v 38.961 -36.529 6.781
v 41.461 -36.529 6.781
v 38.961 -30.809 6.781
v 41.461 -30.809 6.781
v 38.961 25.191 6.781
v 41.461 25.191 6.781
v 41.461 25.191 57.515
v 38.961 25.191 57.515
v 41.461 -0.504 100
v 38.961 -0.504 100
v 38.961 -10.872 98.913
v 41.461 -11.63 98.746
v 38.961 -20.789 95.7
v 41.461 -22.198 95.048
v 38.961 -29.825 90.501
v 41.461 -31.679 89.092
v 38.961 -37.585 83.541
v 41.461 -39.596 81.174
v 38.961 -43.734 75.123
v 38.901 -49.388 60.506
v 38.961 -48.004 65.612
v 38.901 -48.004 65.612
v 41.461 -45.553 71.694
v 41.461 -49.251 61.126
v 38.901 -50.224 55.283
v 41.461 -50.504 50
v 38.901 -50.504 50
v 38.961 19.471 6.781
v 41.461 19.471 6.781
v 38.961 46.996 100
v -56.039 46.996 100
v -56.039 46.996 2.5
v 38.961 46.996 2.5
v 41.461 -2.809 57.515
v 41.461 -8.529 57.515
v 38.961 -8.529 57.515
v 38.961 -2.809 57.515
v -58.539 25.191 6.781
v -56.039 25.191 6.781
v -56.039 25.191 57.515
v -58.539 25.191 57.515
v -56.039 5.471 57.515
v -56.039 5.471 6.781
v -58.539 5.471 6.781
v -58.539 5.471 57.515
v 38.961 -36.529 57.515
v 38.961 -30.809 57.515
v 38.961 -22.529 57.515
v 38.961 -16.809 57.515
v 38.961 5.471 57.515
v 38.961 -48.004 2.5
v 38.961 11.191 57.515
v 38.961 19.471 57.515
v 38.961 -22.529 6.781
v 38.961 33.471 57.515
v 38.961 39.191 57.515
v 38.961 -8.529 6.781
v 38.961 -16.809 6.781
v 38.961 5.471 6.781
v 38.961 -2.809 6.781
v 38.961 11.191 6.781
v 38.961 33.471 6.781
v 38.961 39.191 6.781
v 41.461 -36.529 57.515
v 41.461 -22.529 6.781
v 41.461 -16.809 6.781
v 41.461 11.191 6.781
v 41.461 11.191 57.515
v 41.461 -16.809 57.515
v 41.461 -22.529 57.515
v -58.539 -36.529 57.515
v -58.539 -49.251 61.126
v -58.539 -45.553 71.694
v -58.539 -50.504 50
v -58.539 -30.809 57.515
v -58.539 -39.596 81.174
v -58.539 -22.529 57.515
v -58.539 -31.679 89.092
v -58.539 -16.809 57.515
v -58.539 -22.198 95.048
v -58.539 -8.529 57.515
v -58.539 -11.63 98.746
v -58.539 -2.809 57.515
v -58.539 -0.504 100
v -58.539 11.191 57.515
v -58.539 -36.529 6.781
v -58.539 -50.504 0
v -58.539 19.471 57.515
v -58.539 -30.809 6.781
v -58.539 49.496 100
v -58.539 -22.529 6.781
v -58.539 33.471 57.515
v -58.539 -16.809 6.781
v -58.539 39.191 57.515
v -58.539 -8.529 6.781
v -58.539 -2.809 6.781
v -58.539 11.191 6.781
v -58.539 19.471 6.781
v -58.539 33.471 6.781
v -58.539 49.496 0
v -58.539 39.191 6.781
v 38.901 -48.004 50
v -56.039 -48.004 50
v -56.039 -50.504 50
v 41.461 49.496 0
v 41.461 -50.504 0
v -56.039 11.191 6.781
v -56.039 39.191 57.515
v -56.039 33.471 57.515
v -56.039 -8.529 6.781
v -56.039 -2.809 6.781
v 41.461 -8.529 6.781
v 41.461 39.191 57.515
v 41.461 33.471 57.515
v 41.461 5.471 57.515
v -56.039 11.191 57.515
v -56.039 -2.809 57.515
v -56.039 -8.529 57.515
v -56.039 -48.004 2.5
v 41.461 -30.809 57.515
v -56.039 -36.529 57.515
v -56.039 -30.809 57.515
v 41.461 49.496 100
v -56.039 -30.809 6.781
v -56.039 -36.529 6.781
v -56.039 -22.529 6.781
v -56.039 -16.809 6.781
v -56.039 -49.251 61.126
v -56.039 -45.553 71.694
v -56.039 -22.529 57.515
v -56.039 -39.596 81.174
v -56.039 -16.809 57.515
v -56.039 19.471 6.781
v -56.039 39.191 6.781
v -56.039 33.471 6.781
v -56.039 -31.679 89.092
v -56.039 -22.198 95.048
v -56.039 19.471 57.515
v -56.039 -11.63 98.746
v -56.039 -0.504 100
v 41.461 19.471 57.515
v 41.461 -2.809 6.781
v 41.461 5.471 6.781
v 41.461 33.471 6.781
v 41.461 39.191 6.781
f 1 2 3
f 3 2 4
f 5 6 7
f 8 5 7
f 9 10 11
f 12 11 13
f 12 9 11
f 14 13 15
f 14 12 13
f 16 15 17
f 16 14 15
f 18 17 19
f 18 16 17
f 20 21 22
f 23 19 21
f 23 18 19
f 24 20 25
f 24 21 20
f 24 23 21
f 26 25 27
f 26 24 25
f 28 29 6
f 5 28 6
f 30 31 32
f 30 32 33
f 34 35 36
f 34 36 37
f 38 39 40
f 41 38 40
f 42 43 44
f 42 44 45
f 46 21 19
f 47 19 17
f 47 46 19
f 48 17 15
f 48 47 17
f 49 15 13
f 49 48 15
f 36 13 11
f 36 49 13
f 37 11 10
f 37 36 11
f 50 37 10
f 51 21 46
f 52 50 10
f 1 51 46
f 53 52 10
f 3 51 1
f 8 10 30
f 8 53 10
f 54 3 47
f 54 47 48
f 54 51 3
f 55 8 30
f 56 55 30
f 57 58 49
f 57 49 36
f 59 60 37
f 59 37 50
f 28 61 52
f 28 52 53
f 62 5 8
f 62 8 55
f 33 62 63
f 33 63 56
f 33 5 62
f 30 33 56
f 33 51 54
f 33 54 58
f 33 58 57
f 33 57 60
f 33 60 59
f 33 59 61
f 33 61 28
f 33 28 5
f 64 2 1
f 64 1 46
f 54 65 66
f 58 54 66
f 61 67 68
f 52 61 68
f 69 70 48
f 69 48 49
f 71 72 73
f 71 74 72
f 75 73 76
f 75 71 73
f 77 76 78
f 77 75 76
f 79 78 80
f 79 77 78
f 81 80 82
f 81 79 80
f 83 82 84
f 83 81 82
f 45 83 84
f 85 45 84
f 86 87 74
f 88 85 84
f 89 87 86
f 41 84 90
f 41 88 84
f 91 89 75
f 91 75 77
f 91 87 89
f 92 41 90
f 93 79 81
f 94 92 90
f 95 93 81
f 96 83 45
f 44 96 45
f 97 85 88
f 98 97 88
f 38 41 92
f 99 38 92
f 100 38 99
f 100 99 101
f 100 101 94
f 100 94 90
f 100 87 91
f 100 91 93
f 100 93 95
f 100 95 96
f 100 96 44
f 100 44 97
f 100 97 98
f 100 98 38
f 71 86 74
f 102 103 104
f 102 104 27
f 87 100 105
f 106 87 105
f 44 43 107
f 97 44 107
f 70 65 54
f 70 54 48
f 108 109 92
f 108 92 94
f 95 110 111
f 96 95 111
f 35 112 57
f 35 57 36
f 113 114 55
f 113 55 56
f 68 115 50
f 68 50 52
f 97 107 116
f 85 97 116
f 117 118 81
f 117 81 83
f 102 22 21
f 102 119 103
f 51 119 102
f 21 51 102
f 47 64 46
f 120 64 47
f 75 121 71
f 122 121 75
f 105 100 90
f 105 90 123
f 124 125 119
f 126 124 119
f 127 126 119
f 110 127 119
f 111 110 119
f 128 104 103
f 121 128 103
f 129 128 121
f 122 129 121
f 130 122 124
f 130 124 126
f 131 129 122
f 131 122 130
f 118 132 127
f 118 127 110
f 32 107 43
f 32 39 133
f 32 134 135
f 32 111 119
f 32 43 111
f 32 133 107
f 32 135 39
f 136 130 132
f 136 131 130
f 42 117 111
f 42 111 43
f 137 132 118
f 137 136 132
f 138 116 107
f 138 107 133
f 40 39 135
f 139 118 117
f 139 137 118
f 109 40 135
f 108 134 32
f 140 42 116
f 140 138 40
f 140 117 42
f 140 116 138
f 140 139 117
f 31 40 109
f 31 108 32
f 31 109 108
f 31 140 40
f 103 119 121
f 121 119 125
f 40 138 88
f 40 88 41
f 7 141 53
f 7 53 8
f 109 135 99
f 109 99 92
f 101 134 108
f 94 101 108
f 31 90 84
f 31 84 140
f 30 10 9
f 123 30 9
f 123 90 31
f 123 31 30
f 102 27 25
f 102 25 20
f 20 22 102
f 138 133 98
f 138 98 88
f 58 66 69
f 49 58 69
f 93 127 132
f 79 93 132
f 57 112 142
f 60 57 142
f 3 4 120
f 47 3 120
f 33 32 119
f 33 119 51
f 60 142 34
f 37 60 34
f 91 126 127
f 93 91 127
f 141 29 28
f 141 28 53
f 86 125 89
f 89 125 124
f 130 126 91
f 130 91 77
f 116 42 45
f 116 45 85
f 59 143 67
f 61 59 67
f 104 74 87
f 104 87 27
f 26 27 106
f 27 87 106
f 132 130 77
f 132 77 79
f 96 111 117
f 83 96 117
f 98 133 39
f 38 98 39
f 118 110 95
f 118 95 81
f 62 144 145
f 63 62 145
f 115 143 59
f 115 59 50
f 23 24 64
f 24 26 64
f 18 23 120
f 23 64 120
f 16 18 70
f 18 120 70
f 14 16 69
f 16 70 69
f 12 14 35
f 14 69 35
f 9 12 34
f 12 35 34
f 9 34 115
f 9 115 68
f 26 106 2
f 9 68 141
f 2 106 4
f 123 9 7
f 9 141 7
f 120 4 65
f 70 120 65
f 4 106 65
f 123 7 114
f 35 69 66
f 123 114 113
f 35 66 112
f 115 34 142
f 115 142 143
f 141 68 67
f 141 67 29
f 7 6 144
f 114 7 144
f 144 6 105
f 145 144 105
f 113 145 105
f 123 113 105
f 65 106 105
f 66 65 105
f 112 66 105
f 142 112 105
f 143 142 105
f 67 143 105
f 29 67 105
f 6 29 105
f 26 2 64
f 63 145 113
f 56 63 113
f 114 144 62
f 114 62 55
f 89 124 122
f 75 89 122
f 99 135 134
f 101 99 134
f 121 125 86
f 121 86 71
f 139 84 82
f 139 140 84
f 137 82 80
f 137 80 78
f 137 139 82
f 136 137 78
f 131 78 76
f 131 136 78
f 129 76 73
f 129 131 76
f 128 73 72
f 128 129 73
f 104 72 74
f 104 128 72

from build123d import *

# Parameters (mm, degrees)
F0_W     = 100
F0_H     = 100
F1_DEPTH = 100
F2_T     = -2.5
F3_W     = 94.9397633225
F3_H     = 2.5
F4_DEPTH = 50
F5_R     = 50
F6_W     = 5.7191289961
F6_H     = 50.7341860794
F7_DEPTH = 100.001


with BuildPart() as f1:
    # F0 (on Top) → F1 (new body)
    with BuildSketch(Plane.XY):
        with Locations((-8.5391569883, -0.5041474987)):
            Rectangle(F0_W, F0_H)
    extrude(amount=F1_DEPTH)

    # F2
    f2_openings = [f1.faces().sort_by_distance(p)[0] for p in [
        (-8.539157, -0.504147, 100),
    ]]
    offset(amount=F2_T, openings=f2_openings)

    # F3 (on face) → F4 (cut)
    with BuildSketch(Plane.XY.offset(100)):
        with Locations((-8.569275327, -49.2541474987)):
            Rectangle(F3_W, F3_H)
    extrude(amount=-F4_DEPTH, mode=Mode.SUBTRACT)

    # F5
    f5_edges = [f1.edges().sort_by_distance(p)[0] for p in [
        (-57.289157, -50.504147, 100),
        (40.180725, -50.504147, 100),
    ]]
    fillet(f5_edges, radius=F5_R)

    # F6 (on face) → F7 (cut, through all)
    with BuildSketch(Plane.YZ.offset(41.4608430117)):
        with Locations((-33.6690526456, 32.1479656268)):
            Rectangle(F6_W, F6_H)
        with Locations((-19.6690526456, 32.1479656268)):
            Rectangle(F6_W, F6_H)
        with Locations((-5.6690526456, 32.1479656268)):
            Rectangle(F6_W, F6_H)
        with Locations((8.3309473544, 32.1479656268)):
            Rectangle(F6_W, F6_H)
        with Locations((22.3309473544, 32.1479656268)):
            Rectangle(F6_W, F6_H)
        with Locations((36.3309473544, 32.1479656268)):
            Rectangle(F6_W, F6_H)
    extrude(amount=-F7_DEPTH, mode=Mode.SUBTRACT)


solid = f1.part
